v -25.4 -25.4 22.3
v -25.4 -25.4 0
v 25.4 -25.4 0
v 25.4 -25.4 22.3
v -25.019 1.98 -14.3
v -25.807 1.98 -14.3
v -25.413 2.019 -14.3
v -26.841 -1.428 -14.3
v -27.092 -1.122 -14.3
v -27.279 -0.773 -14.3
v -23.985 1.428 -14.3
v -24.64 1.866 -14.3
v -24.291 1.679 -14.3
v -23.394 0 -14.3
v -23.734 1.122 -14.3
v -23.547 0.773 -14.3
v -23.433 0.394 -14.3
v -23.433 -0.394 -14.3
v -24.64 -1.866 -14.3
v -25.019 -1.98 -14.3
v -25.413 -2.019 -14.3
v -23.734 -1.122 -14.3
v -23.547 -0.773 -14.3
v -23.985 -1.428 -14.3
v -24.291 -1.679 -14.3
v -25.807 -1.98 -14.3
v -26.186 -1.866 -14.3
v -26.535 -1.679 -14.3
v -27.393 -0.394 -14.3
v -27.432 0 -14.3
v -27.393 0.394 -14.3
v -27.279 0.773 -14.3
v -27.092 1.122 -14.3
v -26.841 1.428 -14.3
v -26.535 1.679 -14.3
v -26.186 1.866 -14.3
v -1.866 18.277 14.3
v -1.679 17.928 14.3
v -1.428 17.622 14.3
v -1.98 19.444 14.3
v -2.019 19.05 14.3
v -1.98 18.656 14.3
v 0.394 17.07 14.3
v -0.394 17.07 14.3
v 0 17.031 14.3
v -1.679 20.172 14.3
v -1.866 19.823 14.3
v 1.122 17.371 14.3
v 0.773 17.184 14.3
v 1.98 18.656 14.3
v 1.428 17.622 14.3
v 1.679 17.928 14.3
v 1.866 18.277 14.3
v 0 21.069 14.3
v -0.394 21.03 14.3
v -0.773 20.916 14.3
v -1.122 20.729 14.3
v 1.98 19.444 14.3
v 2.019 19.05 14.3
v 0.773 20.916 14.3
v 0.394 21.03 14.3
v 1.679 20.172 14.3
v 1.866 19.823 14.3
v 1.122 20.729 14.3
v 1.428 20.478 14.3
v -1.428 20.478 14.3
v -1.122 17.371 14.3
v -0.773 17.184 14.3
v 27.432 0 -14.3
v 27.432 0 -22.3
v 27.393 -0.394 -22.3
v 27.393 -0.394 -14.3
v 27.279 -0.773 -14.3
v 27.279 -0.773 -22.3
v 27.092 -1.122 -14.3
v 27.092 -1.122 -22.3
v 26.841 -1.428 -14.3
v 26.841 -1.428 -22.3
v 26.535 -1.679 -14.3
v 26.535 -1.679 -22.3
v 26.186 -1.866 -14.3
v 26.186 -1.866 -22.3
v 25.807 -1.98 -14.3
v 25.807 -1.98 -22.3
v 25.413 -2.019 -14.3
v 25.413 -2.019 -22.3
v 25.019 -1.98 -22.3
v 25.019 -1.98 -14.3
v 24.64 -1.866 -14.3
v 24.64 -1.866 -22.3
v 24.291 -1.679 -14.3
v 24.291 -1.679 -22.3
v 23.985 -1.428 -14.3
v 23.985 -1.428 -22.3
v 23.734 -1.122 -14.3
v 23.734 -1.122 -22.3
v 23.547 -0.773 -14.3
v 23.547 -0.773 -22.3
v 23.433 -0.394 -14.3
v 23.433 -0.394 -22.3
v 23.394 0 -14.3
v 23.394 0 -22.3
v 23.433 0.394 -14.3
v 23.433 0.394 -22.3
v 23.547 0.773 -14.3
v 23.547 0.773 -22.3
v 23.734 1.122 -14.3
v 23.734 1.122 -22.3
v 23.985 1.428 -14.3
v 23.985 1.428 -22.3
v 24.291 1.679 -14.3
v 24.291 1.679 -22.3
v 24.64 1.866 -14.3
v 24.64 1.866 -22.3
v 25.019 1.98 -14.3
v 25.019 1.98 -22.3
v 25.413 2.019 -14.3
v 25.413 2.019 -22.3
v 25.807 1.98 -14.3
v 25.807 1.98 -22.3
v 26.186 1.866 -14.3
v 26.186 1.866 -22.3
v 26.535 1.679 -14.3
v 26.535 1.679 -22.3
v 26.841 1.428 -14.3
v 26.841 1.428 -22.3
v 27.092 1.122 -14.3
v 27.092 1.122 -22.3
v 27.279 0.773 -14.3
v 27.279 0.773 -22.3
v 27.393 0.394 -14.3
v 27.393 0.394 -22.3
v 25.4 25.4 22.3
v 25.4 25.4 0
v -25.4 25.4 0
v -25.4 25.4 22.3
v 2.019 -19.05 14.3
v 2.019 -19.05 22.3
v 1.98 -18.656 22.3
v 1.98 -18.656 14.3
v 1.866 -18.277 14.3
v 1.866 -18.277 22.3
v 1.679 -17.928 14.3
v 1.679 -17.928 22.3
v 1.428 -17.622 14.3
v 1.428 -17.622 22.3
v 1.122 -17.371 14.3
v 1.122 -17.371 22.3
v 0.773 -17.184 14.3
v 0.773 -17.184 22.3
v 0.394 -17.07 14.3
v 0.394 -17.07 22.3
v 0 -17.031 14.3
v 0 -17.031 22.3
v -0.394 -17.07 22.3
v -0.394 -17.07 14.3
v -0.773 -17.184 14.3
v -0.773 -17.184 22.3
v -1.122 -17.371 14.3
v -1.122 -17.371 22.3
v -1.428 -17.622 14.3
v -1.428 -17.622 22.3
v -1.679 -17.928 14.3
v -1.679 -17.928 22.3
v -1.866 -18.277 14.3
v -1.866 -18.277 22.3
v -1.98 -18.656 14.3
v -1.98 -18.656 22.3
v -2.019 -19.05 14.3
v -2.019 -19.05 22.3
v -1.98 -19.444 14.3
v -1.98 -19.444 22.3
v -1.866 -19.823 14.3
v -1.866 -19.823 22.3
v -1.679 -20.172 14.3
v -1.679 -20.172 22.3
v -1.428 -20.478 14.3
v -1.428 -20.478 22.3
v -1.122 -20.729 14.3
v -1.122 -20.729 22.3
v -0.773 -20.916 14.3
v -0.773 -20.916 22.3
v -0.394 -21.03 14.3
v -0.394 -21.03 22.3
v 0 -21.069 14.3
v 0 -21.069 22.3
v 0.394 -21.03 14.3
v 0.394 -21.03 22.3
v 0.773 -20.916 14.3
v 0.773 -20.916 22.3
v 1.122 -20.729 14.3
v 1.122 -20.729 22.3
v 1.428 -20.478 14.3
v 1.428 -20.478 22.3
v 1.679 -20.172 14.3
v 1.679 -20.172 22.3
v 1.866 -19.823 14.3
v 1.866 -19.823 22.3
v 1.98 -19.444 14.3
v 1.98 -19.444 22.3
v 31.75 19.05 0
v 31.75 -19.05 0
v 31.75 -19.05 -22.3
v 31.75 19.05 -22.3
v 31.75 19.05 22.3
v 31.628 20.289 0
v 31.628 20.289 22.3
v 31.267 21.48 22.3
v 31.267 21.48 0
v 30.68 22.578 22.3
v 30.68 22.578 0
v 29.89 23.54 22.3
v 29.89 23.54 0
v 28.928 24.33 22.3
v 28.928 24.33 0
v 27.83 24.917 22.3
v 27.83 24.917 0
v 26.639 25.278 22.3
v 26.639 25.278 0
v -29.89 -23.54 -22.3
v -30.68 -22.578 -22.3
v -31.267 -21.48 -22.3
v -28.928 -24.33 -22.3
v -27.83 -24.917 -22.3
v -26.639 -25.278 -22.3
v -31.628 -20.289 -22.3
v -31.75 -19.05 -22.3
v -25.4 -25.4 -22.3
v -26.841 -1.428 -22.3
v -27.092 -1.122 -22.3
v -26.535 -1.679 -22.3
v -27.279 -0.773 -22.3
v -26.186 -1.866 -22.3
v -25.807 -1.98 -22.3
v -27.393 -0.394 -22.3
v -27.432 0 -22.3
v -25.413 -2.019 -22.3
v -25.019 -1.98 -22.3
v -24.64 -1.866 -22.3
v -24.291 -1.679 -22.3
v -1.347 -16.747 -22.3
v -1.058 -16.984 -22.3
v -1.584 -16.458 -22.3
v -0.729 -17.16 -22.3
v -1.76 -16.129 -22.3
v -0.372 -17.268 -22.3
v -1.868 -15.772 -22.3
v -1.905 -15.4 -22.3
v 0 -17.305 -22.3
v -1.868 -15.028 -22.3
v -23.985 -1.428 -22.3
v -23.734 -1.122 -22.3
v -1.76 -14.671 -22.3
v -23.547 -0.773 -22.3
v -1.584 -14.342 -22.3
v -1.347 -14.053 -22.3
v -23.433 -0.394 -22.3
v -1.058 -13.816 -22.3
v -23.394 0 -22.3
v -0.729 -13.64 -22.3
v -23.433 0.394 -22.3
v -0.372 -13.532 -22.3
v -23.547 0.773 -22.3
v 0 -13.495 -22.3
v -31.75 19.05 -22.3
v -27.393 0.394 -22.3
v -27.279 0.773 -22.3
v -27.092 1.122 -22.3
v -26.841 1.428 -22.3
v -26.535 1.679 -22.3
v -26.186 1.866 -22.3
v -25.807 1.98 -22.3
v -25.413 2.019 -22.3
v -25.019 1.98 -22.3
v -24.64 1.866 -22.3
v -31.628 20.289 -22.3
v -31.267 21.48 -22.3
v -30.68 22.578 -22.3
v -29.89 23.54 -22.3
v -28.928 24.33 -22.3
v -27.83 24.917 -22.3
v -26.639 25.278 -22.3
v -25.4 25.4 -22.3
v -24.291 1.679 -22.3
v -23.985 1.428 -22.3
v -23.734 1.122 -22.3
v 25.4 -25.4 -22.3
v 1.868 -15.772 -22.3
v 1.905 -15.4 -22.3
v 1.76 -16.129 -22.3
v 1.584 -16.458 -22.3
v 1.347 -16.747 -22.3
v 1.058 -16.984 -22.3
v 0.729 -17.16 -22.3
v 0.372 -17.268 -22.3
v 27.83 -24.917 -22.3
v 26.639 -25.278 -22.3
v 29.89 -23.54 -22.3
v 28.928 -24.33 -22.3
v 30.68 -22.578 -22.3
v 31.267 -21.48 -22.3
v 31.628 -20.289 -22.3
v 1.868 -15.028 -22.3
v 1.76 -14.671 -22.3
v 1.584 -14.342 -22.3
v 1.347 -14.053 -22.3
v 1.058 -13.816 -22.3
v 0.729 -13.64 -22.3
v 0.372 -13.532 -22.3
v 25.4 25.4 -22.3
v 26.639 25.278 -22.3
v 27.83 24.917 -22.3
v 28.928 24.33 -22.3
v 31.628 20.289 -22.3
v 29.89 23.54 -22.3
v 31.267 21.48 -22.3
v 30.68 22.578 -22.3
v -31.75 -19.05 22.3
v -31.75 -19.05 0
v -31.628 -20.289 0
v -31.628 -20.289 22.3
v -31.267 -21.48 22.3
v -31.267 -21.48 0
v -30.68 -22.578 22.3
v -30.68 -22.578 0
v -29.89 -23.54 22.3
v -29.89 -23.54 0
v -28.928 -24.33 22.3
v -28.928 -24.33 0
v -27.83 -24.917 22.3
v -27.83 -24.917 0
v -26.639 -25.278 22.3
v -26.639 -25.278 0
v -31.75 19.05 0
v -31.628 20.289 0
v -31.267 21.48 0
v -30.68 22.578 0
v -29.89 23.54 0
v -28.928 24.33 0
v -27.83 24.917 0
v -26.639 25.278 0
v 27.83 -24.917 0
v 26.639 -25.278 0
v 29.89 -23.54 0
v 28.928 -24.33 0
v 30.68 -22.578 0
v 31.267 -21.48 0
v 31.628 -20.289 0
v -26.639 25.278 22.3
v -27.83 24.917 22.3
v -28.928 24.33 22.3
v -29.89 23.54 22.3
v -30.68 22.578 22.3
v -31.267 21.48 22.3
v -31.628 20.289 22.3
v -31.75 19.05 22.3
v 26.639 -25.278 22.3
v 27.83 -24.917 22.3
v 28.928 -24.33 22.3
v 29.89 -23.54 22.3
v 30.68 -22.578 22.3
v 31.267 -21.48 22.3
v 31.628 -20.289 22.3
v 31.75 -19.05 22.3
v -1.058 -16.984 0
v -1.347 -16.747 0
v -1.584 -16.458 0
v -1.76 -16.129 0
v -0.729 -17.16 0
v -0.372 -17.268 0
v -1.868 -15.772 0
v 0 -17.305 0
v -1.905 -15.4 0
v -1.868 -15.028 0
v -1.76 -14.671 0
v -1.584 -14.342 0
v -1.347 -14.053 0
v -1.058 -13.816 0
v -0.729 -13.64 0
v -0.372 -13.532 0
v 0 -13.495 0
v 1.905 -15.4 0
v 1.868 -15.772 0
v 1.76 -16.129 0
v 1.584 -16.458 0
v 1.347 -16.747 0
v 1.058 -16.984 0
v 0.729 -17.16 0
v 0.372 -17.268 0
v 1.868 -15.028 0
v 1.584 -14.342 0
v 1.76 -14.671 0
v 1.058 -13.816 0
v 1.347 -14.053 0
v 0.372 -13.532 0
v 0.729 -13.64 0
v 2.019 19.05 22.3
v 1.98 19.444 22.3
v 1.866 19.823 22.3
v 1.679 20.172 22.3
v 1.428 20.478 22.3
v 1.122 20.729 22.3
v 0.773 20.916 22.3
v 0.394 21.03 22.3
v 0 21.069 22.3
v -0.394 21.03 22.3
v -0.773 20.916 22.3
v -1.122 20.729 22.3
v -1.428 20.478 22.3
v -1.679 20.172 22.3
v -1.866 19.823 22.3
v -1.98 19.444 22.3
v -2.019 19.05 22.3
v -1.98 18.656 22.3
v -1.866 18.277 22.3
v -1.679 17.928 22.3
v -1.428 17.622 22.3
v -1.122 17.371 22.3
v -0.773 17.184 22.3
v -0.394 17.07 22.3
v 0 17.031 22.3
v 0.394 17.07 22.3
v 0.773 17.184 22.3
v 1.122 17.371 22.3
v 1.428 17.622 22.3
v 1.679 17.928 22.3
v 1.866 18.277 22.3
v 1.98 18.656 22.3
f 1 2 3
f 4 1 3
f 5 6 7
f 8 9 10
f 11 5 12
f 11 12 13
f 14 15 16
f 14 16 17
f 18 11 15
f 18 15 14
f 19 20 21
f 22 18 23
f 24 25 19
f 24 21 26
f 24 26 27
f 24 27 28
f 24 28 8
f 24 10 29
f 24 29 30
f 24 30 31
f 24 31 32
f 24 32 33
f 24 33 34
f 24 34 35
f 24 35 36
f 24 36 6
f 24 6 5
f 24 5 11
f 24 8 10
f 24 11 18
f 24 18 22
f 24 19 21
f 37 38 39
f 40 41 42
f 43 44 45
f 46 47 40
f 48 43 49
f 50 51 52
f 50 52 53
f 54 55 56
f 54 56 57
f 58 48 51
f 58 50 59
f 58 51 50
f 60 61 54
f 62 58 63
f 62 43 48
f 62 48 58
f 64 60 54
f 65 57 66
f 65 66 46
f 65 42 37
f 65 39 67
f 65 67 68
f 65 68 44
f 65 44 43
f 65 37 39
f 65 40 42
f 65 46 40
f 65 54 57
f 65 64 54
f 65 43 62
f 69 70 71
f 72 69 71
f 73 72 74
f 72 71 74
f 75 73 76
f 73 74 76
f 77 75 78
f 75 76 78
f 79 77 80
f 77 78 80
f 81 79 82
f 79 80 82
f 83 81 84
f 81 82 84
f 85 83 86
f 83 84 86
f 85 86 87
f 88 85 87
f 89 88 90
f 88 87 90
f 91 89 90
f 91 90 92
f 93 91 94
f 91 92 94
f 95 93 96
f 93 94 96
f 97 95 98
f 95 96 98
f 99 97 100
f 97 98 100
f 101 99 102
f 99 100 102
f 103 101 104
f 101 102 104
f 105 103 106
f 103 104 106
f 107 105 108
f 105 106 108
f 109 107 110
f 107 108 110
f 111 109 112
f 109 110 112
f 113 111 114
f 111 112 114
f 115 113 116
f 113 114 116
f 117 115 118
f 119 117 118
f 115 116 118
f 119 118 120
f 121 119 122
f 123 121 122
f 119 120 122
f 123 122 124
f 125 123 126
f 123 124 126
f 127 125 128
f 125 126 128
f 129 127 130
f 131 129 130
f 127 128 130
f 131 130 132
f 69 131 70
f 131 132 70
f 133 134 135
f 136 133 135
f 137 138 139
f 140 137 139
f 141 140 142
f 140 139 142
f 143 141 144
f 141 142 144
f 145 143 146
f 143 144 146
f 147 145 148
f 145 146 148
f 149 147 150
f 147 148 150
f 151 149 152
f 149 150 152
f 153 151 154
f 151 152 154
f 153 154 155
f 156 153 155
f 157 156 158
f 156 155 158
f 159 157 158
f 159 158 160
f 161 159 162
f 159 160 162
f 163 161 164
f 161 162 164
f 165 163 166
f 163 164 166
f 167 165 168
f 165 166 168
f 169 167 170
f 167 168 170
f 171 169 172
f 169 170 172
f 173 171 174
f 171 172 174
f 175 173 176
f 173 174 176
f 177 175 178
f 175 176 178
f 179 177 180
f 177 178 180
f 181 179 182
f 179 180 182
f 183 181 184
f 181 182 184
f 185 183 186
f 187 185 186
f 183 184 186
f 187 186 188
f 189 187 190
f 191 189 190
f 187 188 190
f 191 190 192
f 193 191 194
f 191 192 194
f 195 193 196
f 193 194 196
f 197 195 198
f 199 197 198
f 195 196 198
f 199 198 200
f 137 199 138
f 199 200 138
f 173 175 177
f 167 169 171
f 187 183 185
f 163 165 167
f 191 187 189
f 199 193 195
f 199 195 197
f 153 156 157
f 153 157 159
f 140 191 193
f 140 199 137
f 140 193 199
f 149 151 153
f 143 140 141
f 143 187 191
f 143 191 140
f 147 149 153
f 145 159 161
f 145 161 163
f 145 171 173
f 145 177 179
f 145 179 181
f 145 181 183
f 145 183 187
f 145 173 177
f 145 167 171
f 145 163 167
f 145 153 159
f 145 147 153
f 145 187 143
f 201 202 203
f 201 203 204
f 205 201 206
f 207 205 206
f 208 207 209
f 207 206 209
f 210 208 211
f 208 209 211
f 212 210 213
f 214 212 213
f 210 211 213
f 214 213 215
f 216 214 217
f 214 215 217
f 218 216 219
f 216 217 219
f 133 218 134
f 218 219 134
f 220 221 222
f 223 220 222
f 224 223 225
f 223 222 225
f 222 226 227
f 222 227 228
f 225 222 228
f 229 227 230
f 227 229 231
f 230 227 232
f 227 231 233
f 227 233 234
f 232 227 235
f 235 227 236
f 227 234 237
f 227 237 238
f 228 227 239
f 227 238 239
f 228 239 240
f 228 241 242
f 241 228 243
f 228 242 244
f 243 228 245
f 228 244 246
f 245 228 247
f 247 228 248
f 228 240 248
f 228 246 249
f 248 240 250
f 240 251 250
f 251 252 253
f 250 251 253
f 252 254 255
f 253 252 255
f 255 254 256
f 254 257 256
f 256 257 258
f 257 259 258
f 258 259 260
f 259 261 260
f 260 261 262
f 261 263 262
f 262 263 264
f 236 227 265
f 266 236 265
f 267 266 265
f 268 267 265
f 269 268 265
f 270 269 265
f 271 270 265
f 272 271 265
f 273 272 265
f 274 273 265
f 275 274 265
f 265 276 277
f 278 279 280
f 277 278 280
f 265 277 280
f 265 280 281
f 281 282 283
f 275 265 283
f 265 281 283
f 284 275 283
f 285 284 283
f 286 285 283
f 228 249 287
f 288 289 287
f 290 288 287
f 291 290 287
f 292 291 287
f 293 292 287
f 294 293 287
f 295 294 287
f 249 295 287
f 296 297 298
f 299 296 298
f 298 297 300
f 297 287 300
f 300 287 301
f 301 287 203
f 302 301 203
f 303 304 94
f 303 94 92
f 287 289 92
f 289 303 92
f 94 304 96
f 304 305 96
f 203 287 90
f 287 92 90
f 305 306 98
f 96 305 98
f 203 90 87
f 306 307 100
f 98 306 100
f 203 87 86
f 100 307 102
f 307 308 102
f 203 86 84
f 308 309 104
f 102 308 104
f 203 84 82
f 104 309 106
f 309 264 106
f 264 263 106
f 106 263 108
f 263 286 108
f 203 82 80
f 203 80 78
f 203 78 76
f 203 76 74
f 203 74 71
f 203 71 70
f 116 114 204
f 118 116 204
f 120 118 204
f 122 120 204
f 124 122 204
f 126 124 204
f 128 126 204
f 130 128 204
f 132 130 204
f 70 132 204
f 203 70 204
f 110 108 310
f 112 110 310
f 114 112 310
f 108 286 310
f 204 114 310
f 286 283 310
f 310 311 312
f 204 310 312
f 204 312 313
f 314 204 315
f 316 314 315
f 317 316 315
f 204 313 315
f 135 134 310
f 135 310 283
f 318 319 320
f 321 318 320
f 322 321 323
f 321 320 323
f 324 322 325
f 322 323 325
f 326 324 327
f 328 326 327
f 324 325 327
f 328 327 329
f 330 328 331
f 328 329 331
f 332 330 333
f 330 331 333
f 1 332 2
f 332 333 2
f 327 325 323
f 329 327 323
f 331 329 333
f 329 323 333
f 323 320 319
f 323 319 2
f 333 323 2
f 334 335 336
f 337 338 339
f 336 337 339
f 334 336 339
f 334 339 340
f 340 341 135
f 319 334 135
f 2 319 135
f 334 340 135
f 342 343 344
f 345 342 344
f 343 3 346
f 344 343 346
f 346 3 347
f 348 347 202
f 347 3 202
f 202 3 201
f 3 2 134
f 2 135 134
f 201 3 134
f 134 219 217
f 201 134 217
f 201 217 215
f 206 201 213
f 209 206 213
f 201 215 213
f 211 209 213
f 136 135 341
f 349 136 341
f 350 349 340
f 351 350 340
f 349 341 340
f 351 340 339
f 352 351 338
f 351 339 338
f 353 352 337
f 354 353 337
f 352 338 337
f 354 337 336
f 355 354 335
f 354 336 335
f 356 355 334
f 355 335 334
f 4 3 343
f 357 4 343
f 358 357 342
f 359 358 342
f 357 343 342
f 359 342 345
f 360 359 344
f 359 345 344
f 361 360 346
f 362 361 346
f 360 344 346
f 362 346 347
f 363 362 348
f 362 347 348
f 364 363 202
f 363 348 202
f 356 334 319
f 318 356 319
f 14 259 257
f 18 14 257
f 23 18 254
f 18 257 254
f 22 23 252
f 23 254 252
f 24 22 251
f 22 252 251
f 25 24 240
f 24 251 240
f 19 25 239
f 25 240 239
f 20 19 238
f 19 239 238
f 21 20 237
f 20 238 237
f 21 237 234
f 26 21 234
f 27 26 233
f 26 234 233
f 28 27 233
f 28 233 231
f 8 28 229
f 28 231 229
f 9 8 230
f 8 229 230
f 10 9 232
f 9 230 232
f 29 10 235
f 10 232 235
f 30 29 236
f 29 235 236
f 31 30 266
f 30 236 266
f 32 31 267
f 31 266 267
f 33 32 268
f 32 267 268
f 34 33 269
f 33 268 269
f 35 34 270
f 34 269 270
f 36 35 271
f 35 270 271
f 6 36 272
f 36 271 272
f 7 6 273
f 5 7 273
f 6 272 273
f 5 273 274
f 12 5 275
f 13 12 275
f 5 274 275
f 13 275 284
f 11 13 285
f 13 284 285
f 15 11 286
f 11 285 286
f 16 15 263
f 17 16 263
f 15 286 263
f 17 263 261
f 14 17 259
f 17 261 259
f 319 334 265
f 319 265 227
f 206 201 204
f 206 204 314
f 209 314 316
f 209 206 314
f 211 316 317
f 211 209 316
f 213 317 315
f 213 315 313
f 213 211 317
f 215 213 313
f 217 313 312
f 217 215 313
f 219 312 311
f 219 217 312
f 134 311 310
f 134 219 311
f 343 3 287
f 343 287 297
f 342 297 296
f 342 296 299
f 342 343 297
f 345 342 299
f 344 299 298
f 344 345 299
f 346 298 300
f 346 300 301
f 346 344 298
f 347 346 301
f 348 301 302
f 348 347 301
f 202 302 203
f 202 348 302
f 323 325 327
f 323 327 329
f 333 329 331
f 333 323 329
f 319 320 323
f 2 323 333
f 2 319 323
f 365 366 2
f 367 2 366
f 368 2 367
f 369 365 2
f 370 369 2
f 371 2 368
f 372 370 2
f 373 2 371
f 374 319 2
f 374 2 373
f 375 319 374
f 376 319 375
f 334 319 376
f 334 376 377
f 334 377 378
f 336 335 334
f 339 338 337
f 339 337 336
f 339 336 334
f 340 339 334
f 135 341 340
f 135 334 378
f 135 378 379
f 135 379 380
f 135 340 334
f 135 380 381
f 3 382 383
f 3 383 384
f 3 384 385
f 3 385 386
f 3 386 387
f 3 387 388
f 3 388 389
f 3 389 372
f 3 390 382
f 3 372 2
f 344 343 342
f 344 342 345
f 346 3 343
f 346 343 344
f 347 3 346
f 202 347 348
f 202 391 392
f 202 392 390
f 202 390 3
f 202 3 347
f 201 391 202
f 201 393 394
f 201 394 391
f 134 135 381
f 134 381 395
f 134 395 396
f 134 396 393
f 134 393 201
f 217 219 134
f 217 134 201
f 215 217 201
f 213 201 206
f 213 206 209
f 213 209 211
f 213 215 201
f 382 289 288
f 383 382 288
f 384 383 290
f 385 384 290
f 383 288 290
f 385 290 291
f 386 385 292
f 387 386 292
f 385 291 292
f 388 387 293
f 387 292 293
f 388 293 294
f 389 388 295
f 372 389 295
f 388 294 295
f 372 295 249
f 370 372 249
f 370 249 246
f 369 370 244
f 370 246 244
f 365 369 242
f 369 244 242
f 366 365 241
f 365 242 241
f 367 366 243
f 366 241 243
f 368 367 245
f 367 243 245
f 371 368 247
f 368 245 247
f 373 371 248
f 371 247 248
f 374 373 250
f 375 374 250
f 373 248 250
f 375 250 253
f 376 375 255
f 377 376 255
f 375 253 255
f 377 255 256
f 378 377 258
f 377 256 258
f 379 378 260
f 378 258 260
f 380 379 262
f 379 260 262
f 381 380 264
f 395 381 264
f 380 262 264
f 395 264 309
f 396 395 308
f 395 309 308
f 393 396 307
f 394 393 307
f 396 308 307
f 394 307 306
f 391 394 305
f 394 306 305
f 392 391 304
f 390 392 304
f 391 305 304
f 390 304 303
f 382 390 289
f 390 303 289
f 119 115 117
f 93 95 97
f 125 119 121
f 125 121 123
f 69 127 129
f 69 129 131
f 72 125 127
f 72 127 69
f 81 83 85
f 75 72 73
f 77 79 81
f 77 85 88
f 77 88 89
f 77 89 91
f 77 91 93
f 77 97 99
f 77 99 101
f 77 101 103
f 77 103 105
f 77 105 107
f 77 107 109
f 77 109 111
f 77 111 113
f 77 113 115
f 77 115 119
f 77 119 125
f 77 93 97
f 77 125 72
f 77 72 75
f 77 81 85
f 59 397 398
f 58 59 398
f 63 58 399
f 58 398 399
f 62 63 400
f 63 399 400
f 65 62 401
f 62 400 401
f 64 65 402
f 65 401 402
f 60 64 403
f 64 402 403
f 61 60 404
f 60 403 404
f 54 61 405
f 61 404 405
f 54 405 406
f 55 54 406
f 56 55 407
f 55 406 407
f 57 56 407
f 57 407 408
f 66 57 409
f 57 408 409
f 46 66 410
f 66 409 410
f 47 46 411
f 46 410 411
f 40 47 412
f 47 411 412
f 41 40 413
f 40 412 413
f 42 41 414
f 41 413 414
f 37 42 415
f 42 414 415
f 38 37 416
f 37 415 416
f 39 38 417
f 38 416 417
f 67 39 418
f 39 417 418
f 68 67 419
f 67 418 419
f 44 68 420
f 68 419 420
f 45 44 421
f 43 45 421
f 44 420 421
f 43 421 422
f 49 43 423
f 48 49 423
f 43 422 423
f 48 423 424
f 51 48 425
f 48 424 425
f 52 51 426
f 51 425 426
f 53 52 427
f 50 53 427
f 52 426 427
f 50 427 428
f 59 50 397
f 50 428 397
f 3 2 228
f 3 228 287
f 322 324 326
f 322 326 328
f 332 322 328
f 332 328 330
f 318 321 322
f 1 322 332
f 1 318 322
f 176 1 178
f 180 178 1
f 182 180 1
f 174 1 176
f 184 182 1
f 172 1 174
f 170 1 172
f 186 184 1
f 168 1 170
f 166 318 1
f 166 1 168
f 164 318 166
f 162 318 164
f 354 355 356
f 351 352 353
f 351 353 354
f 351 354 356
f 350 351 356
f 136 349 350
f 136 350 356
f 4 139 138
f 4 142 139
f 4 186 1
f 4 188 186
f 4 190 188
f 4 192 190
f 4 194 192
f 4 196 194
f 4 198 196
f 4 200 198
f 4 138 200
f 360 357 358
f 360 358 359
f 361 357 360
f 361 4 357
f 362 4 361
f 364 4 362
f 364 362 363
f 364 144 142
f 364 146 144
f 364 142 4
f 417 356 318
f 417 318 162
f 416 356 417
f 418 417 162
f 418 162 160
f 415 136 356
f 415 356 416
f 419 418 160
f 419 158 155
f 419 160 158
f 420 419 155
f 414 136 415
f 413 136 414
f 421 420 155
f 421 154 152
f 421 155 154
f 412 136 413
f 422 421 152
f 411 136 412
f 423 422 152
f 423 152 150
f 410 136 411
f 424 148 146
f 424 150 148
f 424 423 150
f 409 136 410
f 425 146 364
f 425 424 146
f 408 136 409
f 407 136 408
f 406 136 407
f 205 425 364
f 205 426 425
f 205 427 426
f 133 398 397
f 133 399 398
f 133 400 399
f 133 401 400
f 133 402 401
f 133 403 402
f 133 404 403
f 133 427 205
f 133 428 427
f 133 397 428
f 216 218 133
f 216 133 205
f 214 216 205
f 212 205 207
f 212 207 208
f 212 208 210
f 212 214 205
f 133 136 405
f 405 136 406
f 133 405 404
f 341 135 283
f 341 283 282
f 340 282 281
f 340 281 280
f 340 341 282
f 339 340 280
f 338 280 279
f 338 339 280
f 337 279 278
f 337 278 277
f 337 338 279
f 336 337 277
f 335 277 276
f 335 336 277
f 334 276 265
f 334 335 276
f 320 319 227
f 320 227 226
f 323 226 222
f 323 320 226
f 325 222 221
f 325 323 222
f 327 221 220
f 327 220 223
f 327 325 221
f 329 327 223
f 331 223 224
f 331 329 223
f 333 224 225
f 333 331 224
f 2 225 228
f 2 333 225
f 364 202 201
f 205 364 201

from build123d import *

# Parameters (mm, degrees)
F1_DEPTH = 22.3
F2_R     = 2.0193
F3_DEPTH = 8
F4_DEPTH = 22.3
F5_R     = 1.905
F6_DEPTH = 22.3
F7_R     = 2.0193
F8_DEPTH = 8


with BuildPart() as f1:
    # F0 (on Top) → F1 (new body)
    with BuildSketch(Plane.XY):
        with BuildLine():
            ThreePointArc((31.75, 19.05), (29.8901280605, 23.5401280605), (25.4, 25.4))
            Line((25.4, 25.4), (-25.4, 25.4))
            ThreePointArc((-25.4, 25.4), (-29.8901280605, 23.5401280605), (-31.75, 19.05))
            Line((-31.75, 19.05), (-31.75, -19.05))
            ThreePointArc((-31.75, -19.05), (-29.8901280605, -23.5401280605), (-25.4, -25.4))
            Line((-25.4, -25.4), (25.4, -25.4))
            ThreePointArc((25.4, -25.4), (29.8901280605, -23.5401280605), (31.75, -19.05))
            Line((31.75, -19.05), (31.75, 19.05))
        make_face()
    extrude(amount=F1_DEPTH)

    # F2 (on face) → F3 (cut)
    with BuildSketch(Plane.XY.offset(22.3)):
        with Locations((0, 19.05)):
            Circle(F2_R)
        with Locations((0, -19.05)):
            Circle(F2_R)
    extrude(amount=-F3_DEPTH, mode=Mode.SUBTRACT)


with BuildPart() as f4:
    # F4 (new): a face of the model
    f4_faces = [f1.part.faces().sort_by_distance(p)[0] for p in [
        (0, 0, 0),
    ]]
    extrude(f4_faces, amount=F4_DEPTH)

    # F5 (on face) → F6 (cut, through all)
    with BuildSketch(Plane(origin=(0, 0, -22.3), x_dir=(1, 0, 0), z_dir=(0, 0, -1))):
        with Locations((0, 15.4)):
            Circle(F5_R)
    extrude(amount=-F6_DEPTH, mode=Mode.SUBTRACT)

    # F7 (on face) → F8 (cut)
    with BuildSketch(Plane(origin=(0, 0, -22.3), x_dir=(1, 0, 0), z_dir=(0, 0, -1))):
        with Locations((-25.413, 0)):
            Circle(F7_R)
        with Locations((25.413, 0)):
            Circle(F7_R)
    extrude(amount=-F8_DEPTH, mode=Mode.SUBTRACT)


solid = Compound([f1.part, f4.part])
